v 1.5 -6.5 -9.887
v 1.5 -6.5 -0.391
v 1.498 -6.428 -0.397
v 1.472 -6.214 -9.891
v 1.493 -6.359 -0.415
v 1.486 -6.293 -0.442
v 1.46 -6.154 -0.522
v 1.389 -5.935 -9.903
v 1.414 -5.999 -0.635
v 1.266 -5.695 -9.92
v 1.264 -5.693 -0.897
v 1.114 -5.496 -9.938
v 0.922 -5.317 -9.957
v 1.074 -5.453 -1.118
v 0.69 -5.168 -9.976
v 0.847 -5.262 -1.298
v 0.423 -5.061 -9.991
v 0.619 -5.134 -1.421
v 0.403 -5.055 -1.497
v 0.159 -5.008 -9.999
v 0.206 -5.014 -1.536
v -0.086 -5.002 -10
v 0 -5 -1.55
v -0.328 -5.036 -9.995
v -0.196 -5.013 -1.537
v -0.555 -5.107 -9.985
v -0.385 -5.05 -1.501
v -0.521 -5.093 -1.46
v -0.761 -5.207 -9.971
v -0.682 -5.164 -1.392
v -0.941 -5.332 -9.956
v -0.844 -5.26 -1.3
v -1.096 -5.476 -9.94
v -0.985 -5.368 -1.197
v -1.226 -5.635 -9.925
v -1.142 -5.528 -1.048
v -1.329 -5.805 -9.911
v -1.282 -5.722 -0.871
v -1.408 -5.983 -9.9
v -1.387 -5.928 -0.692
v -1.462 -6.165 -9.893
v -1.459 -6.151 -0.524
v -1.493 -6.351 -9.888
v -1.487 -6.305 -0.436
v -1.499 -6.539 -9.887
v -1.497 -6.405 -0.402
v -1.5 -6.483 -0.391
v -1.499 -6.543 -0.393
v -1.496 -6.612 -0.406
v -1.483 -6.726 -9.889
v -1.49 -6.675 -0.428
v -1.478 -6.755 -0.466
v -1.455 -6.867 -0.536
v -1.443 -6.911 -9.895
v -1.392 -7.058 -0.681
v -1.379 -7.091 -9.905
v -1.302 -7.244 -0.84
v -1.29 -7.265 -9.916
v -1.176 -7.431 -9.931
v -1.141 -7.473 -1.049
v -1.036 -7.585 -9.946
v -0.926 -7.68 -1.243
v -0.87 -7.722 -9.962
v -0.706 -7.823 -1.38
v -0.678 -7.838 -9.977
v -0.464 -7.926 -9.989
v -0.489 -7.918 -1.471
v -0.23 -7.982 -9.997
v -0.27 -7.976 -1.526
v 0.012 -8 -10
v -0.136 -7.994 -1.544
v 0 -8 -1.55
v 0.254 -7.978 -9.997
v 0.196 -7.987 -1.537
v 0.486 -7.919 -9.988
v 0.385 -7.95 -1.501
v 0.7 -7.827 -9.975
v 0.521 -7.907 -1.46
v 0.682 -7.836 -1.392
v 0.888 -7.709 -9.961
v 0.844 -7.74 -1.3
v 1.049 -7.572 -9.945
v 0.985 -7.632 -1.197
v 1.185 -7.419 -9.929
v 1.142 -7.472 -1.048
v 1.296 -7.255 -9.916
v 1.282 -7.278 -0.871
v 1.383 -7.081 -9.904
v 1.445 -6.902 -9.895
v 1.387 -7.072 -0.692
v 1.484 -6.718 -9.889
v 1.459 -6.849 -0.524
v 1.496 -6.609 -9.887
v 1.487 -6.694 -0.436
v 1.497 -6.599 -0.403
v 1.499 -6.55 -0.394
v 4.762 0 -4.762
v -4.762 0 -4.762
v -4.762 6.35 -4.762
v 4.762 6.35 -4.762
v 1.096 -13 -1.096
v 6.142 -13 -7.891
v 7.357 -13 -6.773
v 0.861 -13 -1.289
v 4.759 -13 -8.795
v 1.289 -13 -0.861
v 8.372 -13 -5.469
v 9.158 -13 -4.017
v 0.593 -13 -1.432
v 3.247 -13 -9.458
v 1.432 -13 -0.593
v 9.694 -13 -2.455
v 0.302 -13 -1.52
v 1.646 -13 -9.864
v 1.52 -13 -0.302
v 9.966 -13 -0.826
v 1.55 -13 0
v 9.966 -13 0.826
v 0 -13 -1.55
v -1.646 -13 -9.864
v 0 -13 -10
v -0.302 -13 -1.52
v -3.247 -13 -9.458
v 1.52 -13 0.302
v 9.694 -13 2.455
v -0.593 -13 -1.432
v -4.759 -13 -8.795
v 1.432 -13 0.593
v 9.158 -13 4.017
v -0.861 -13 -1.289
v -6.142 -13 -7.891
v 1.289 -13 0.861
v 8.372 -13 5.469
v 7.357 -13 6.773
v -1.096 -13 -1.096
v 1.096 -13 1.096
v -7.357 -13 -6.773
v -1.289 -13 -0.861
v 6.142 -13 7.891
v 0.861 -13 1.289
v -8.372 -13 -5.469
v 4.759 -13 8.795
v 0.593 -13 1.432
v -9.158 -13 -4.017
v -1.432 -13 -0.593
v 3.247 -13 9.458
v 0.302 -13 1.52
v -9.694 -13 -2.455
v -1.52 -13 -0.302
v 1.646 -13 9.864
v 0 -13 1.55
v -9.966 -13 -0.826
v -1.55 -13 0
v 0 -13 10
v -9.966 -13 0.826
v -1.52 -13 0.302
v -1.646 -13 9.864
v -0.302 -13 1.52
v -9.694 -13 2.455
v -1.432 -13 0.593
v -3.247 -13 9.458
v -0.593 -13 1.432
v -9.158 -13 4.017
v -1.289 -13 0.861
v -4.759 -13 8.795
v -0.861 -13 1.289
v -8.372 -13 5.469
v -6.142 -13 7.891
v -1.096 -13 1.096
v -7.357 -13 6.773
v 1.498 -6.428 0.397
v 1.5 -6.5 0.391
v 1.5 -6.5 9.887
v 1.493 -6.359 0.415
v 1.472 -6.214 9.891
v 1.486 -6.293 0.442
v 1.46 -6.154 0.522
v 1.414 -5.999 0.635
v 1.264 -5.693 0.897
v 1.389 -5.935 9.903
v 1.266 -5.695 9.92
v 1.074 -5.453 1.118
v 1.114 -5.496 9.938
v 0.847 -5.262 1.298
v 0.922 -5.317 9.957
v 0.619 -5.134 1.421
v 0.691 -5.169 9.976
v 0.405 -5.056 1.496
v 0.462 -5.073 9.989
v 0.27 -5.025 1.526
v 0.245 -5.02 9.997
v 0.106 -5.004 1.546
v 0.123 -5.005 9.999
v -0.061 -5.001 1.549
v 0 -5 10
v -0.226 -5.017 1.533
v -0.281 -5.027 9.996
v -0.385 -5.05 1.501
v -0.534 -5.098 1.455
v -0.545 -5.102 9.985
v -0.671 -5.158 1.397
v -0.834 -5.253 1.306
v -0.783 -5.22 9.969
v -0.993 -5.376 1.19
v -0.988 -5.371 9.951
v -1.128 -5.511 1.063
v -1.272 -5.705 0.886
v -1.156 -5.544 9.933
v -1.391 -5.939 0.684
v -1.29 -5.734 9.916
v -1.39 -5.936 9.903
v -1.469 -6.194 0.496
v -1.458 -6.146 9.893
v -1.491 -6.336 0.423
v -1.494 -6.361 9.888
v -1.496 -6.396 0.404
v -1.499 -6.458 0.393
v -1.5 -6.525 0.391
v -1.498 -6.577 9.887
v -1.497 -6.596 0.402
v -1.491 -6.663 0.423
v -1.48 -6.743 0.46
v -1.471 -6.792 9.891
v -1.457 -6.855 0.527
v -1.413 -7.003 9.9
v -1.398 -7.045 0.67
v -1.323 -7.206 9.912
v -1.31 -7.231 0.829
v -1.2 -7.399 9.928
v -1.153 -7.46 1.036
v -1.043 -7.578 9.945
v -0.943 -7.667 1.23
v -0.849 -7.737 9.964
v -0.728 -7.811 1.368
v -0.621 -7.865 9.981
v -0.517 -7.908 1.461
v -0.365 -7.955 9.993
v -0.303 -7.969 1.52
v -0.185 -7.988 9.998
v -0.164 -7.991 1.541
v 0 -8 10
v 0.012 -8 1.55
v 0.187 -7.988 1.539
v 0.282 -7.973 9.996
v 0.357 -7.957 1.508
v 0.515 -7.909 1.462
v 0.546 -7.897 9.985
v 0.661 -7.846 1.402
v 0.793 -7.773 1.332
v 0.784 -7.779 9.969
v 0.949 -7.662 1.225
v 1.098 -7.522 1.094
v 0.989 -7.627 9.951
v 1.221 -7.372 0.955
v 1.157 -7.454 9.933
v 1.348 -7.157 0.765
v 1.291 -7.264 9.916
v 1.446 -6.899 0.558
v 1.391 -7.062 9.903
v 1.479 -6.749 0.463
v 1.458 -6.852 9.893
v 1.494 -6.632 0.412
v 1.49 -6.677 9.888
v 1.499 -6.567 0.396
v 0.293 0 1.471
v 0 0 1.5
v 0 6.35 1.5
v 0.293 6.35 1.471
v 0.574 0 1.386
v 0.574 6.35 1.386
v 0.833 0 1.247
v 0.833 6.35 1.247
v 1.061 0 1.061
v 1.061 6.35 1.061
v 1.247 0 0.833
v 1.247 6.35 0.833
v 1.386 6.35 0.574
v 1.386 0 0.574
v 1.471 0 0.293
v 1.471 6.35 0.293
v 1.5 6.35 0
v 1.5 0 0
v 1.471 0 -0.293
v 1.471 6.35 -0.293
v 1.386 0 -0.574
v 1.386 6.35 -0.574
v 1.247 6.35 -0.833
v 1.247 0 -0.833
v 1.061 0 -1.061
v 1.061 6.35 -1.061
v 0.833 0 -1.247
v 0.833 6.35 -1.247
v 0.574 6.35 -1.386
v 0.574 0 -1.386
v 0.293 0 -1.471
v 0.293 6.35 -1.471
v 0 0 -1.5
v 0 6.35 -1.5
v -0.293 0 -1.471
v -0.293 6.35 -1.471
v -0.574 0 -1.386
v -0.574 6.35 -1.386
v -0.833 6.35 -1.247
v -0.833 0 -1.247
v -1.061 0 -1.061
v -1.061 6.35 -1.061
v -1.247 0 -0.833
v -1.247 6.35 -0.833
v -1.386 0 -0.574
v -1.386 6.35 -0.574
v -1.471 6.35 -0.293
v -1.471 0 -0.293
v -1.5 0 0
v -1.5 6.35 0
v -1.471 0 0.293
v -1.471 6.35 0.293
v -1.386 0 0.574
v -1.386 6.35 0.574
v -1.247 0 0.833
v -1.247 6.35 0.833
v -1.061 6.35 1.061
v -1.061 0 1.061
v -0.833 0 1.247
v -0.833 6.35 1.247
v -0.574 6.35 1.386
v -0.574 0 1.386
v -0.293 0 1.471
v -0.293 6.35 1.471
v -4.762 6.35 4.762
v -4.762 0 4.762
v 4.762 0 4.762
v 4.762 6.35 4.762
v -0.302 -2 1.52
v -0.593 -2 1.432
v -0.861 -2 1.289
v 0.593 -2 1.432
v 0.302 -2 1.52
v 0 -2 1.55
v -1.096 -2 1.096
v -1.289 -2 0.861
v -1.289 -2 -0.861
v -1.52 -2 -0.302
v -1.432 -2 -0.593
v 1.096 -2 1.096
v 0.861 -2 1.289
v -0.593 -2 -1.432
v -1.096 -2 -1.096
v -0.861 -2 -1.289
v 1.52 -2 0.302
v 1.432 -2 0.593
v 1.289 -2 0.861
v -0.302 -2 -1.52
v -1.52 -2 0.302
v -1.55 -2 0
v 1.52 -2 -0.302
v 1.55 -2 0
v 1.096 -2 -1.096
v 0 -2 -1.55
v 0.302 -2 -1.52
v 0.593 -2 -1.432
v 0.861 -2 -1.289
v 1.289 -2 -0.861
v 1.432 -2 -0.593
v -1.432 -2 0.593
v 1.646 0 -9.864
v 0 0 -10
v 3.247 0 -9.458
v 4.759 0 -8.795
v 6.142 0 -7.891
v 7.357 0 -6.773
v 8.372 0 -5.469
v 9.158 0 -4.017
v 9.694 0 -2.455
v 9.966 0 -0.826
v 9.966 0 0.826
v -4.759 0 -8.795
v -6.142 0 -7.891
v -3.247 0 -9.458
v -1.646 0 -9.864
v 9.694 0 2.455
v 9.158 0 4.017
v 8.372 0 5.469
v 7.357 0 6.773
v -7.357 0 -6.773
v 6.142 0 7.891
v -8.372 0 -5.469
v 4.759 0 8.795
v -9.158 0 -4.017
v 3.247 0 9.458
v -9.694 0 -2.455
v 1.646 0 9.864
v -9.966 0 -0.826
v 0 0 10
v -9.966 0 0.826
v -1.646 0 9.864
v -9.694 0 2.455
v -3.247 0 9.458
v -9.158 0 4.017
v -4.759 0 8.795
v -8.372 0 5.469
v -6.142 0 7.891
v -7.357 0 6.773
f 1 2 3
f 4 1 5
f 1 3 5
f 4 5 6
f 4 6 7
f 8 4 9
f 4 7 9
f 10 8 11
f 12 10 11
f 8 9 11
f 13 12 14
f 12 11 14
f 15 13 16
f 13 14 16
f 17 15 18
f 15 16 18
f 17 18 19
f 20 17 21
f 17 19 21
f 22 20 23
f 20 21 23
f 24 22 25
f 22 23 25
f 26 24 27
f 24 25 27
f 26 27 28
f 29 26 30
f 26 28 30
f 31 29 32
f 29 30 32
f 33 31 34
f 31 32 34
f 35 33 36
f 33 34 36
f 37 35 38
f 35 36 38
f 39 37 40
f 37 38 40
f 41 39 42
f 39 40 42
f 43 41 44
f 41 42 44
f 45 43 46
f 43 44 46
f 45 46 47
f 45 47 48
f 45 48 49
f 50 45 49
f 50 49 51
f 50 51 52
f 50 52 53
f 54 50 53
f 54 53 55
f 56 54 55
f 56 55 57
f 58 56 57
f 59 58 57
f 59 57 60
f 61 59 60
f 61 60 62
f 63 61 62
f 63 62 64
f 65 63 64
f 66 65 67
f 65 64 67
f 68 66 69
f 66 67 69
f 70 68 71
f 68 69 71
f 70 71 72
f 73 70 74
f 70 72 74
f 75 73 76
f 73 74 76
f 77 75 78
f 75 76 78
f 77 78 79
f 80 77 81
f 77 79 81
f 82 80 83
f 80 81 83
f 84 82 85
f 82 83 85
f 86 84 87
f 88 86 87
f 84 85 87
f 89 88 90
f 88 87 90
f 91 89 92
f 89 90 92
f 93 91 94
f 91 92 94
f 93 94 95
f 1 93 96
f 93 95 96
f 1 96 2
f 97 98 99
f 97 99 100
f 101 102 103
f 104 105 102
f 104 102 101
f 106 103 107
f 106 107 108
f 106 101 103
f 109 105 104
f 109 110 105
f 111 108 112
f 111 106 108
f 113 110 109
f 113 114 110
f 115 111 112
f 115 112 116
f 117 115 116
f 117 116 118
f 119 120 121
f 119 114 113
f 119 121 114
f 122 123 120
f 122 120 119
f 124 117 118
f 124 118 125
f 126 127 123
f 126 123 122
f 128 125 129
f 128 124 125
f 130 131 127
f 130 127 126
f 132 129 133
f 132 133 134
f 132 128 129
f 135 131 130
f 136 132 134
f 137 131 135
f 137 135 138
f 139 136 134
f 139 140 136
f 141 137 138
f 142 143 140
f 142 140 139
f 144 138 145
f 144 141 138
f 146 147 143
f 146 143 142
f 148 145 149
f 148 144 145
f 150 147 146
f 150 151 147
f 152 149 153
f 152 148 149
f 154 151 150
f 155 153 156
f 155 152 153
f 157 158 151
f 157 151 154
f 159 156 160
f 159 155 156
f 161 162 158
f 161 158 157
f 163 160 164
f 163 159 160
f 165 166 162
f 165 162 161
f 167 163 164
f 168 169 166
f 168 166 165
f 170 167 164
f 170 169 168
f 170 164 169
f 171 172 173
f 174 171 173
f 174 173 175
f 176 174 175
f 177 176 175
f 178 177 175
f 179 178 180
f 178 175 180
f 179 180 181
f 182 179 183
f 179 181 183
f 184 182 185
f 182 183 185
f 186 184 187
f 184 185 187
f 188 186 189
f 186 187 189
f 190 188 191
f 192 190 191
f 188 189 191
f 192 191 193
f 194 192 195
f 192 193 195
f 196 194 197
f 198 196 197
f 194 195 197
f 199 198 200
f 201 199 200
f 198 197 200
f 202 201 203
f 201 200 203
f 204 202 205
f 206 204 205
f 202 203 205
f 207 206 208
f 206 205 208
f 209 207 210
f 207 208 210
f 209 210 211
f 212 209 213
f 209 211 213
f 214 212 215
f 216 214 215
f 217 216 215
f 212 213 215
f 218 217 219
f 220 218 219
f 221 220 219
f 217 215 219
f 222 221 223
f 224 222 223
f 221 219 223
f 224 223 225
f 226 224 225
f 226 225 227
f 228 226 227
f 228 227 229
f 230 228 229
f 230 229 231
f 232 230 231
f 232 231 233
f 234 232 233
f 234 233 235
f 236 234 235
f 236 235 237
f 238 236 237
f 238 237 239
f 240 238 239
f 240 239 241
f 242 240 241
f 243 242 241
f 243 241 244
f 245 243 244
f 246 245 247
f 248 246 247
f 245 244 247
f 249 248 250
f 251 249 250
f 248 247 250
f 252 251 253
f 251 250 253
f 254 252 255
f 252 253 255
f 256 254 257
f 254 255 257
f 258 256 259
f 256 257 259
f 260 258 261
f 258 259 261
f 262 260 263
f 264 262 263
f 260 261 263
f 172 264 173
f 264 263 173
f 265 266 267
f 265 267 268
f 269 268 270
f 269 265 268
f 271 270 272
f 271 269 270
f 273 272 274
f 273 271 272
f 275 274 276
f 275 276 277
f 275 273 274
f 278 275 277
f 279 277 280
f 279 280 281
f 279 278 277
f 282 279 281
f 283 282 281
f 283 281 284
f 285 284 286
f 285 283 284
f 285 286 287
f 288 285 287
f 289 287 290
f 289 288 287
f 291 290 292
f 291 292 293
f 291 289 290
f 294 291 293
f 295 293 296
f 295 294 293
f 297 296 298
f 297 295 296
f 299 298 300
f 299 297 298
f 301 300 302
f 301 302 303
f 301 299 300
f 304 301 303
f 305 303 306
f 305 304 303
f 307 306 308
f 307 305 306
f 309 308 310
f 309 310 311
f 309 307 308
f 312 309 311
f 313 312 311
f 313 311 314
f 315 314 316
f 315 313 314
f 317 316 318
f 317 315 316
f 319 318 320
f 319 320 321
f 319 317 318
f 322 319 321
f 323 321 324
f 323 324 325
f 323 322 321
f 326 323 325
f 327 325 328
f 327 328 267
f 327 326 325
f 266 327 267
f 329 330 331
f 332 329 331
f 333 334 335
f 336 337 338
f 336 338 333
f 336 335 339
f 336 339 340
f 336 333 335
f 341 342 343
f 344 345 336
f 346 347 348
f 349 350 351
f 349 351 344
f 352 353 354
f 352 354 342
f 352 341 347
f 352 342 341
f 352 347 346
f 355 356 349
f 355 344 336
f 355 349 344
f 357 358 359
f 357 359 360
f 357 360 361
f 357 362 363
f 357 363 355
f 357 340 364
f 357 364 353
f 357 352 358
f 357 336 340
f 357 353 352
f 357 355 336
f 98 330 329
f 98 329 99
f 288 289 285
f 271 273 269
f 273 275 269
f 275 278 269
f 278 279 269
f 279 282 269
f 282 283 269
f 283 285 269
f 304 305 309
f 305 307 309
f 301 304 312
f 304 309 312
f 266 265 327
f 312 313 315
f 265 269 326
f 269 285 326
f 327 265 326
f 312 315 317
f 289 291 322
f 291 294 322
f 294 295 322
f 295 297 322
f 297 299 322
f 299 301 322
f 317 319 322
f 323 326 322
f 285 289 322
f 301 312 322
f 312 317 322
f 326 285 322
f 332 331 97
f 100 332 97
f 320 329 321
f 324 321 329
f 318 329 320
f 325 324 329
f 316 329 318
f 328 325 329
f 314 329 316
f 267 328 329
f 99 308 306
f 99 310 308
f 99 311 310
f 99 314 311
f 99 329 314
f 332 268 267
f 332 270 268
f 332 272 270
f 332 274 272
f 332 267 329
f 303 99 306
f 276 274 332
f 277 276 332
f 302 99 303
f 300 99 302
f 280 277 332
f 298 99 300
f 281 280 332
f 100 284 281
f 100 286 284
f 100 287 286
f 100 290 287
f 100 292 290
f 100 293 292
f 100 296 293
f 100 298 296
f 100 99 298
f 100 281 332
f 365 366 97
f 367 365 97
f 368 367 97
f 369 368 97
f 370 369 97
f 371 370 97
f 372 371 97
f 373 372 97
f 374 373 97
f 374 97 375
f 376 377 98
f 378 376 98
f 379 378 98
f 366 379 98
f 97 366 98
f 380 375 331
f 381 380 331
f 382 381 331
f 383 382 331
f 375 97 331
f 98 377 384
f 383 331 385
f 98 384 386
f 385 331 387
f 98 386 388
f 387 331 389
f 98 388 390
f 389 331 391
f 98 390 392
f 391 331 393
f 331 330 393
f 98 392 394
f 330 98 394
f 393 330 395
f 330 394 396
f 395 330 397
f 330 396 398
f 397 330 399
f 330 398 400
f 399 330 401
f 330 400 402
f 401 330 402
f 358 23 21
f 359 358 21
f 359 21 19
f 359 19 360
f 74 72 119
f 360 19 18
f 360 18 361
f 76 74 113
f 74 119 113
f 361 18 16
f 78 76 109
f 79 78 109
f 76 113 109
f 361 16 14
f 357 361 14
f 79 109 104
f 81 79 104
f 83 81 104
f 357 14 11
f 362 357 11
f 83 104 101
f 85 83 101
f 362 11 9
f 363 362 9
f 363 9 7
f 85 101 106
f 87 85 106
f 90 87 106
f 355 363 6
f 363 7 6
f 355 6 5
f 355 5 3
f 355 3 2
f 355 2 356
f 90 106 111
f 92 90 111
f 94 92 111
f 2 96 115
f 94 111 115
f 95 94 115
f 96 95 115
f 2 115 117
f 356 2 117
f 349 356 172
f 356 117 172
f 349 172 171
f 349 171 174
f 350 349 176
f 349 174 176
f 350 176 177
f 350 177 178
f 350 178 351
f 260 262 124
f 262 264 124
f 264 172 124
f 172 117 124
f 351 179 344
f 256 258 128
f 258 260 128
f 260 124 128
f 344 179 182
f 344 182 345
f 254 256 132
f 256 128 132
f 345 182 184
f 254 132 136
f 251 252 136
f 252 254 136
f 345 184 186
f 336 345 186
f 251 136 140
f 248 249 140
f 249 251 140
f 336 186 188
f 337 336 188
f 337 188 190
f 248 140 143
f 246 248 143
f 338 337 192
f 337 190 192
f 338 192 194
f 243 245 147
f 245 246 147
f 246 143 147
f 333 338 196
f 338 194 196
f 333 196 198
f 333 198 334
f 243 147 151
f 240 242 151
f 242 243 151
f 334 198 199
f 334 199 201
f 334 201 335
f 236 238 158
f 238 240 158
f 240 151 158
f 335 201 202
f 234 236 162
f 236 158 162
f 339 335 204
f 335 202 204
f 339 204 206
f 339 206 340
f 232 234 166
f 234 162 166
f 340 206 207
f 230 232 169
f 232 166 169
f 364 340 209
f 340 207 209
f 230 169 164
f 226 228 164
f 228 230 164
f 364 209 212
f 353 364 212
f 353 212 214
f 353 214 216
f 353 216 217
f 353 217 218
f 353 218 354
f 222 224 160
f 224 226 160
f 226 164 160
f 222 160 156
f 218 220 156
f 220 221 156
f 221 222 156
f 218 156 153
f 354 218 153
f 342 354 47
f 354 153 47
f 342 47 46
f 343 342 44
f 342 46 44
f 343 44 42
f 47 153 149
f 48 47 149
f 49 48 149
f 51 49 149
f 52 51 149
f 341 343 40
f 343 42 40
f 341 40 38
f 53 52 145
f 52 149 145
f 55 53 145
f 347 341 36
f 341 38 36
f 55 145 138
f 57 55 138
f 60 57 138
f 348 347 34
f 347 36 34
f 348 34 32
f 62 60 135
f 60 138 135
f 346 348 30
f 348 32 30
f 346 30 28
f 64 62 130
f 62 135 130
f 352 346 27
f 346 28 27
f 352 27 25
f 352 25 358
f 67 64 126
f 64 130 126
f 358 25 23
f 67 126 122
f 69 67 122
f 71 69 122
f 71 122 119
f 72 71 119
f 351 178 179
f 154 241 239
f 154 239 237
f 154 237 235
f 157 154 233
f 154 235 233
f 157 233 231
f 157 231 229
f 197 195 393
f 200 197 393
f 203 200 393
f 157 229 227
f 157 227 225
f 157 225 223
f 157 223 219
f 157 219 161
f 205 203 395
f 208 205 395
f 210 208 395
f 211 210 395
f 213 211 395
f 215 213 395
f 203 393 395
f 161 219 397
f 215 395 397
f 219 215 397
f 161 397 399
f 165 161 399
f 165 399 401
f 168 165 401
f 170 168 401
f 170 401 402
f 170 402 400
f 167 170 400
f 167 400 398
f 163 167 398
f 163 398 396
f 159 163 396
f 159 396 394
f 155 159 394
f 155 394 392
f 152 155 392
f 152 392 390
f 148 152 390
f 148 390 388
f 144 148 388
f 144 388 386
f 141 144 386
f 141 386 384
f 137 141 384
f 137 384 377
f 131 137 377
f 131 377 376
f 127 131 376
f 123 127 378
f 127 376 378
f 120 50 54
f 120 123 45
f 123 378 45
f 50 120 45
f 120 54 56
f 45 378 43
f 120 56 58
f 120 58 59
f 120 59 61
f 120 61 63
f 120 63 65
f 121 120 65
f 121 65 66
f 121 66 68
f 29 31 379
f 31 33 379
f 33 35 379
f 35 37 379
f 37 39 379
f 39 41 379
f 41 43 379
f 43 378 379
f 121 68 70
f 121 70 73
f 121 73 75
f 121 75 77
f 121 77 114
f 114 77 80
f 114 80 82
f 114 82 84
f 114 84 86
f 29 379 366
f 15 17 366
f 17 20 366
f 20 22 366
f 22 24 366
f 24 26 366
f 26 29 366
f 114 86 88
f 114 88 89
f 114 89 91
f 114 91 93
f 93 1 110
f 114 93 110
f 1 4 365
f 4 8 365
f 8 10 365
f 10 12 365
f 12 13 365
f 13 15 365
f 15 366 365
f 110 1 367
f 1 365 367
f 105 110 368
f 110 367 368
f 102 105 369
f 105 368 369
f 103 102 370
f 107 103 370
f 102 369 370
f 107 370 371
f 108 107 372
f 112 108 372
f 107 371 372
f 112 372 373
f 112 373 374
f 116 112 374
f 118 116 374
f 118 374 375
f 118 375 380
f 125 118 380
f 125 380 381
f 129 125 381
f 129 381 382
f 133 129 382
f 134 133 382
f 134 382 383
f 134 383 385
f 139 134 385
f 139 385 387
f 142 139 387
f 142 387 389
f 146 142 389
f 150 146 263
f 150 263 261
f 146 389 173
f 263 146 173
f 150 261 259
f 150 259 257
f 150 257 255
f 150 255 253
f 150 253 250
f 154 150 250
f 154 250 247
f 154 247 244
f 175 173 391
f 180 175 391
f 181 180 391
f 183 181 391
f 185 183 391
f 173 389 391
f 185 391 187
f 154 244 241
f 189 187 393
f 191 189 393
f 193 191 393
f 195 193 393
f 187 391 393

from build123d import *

# Parameters (mm, degrees)
SKETCH1_W           = 9.525
SKETCH1_H           = 9.525
SKETCH1_R           = 1.5
BOSS_EXTRUDE1_DEPTH = 6.35
SKETCH2_R           = 10
BOSS_EXTRUDE2_DEPTH = 13
SKETCH3_R           = 1.55
CUT_EXTRUDE1_DEPTH  = 11
SKETCH5_R           = 1.5
CUT_EXTRUDE2_DEPTH  = 10


with BuildPart() as part:
    # Sketch1 → Boss-Extrude1 (new body)
    with BuildSketch(Plane(origin=(0, 0, 0), x_dir=(1, 0, 0), z_dir=(0, 1, 0))):
        Rectangle(SKETCH1_W, SKETCH1_H)
        with Locations(Location((0, 0, 0), (0, 0, 270))):
            Circle(SKETCH1_R, mode=Mode.SUBTRACT)
    extrude(amount=BOSS_EXTRUDE1_DEPTH)

    # Sketch2 → Boss-Extrude2 (add)
    with BuildSketch(Plane.XZ):
        with Locations(Location((0, 0, 0), (0, 0, 90))):
            Circle(SKETCH2_R)
    extrude(amount=BOSS_EXTRUDE2_DEPTH)

    # Sketch3 → Cut-Extrude1 (cut)
    with BuildSketch(Plane.XZ.offset(13)):
        with Locations(Location((0, 0, 0), (0, 0, 270))):
            Circle(SKETCH3_R)
    extrude(amount=-CUT_EXTRUDE1_DEPTH, mode=Mode.SUBTRACT)

    # Sketch5 → Cut-Extrude2 (cut, symmetric)
    with BuildSketch(Plane.XY):
        with Locations((0, -6.5)):
            Circle(SKETCH5_R)
    extrude(amount=CUT_EXTRUDE2_DEPTH, both=True, mode=Mode.SUBTRACT)


solid = part.part
